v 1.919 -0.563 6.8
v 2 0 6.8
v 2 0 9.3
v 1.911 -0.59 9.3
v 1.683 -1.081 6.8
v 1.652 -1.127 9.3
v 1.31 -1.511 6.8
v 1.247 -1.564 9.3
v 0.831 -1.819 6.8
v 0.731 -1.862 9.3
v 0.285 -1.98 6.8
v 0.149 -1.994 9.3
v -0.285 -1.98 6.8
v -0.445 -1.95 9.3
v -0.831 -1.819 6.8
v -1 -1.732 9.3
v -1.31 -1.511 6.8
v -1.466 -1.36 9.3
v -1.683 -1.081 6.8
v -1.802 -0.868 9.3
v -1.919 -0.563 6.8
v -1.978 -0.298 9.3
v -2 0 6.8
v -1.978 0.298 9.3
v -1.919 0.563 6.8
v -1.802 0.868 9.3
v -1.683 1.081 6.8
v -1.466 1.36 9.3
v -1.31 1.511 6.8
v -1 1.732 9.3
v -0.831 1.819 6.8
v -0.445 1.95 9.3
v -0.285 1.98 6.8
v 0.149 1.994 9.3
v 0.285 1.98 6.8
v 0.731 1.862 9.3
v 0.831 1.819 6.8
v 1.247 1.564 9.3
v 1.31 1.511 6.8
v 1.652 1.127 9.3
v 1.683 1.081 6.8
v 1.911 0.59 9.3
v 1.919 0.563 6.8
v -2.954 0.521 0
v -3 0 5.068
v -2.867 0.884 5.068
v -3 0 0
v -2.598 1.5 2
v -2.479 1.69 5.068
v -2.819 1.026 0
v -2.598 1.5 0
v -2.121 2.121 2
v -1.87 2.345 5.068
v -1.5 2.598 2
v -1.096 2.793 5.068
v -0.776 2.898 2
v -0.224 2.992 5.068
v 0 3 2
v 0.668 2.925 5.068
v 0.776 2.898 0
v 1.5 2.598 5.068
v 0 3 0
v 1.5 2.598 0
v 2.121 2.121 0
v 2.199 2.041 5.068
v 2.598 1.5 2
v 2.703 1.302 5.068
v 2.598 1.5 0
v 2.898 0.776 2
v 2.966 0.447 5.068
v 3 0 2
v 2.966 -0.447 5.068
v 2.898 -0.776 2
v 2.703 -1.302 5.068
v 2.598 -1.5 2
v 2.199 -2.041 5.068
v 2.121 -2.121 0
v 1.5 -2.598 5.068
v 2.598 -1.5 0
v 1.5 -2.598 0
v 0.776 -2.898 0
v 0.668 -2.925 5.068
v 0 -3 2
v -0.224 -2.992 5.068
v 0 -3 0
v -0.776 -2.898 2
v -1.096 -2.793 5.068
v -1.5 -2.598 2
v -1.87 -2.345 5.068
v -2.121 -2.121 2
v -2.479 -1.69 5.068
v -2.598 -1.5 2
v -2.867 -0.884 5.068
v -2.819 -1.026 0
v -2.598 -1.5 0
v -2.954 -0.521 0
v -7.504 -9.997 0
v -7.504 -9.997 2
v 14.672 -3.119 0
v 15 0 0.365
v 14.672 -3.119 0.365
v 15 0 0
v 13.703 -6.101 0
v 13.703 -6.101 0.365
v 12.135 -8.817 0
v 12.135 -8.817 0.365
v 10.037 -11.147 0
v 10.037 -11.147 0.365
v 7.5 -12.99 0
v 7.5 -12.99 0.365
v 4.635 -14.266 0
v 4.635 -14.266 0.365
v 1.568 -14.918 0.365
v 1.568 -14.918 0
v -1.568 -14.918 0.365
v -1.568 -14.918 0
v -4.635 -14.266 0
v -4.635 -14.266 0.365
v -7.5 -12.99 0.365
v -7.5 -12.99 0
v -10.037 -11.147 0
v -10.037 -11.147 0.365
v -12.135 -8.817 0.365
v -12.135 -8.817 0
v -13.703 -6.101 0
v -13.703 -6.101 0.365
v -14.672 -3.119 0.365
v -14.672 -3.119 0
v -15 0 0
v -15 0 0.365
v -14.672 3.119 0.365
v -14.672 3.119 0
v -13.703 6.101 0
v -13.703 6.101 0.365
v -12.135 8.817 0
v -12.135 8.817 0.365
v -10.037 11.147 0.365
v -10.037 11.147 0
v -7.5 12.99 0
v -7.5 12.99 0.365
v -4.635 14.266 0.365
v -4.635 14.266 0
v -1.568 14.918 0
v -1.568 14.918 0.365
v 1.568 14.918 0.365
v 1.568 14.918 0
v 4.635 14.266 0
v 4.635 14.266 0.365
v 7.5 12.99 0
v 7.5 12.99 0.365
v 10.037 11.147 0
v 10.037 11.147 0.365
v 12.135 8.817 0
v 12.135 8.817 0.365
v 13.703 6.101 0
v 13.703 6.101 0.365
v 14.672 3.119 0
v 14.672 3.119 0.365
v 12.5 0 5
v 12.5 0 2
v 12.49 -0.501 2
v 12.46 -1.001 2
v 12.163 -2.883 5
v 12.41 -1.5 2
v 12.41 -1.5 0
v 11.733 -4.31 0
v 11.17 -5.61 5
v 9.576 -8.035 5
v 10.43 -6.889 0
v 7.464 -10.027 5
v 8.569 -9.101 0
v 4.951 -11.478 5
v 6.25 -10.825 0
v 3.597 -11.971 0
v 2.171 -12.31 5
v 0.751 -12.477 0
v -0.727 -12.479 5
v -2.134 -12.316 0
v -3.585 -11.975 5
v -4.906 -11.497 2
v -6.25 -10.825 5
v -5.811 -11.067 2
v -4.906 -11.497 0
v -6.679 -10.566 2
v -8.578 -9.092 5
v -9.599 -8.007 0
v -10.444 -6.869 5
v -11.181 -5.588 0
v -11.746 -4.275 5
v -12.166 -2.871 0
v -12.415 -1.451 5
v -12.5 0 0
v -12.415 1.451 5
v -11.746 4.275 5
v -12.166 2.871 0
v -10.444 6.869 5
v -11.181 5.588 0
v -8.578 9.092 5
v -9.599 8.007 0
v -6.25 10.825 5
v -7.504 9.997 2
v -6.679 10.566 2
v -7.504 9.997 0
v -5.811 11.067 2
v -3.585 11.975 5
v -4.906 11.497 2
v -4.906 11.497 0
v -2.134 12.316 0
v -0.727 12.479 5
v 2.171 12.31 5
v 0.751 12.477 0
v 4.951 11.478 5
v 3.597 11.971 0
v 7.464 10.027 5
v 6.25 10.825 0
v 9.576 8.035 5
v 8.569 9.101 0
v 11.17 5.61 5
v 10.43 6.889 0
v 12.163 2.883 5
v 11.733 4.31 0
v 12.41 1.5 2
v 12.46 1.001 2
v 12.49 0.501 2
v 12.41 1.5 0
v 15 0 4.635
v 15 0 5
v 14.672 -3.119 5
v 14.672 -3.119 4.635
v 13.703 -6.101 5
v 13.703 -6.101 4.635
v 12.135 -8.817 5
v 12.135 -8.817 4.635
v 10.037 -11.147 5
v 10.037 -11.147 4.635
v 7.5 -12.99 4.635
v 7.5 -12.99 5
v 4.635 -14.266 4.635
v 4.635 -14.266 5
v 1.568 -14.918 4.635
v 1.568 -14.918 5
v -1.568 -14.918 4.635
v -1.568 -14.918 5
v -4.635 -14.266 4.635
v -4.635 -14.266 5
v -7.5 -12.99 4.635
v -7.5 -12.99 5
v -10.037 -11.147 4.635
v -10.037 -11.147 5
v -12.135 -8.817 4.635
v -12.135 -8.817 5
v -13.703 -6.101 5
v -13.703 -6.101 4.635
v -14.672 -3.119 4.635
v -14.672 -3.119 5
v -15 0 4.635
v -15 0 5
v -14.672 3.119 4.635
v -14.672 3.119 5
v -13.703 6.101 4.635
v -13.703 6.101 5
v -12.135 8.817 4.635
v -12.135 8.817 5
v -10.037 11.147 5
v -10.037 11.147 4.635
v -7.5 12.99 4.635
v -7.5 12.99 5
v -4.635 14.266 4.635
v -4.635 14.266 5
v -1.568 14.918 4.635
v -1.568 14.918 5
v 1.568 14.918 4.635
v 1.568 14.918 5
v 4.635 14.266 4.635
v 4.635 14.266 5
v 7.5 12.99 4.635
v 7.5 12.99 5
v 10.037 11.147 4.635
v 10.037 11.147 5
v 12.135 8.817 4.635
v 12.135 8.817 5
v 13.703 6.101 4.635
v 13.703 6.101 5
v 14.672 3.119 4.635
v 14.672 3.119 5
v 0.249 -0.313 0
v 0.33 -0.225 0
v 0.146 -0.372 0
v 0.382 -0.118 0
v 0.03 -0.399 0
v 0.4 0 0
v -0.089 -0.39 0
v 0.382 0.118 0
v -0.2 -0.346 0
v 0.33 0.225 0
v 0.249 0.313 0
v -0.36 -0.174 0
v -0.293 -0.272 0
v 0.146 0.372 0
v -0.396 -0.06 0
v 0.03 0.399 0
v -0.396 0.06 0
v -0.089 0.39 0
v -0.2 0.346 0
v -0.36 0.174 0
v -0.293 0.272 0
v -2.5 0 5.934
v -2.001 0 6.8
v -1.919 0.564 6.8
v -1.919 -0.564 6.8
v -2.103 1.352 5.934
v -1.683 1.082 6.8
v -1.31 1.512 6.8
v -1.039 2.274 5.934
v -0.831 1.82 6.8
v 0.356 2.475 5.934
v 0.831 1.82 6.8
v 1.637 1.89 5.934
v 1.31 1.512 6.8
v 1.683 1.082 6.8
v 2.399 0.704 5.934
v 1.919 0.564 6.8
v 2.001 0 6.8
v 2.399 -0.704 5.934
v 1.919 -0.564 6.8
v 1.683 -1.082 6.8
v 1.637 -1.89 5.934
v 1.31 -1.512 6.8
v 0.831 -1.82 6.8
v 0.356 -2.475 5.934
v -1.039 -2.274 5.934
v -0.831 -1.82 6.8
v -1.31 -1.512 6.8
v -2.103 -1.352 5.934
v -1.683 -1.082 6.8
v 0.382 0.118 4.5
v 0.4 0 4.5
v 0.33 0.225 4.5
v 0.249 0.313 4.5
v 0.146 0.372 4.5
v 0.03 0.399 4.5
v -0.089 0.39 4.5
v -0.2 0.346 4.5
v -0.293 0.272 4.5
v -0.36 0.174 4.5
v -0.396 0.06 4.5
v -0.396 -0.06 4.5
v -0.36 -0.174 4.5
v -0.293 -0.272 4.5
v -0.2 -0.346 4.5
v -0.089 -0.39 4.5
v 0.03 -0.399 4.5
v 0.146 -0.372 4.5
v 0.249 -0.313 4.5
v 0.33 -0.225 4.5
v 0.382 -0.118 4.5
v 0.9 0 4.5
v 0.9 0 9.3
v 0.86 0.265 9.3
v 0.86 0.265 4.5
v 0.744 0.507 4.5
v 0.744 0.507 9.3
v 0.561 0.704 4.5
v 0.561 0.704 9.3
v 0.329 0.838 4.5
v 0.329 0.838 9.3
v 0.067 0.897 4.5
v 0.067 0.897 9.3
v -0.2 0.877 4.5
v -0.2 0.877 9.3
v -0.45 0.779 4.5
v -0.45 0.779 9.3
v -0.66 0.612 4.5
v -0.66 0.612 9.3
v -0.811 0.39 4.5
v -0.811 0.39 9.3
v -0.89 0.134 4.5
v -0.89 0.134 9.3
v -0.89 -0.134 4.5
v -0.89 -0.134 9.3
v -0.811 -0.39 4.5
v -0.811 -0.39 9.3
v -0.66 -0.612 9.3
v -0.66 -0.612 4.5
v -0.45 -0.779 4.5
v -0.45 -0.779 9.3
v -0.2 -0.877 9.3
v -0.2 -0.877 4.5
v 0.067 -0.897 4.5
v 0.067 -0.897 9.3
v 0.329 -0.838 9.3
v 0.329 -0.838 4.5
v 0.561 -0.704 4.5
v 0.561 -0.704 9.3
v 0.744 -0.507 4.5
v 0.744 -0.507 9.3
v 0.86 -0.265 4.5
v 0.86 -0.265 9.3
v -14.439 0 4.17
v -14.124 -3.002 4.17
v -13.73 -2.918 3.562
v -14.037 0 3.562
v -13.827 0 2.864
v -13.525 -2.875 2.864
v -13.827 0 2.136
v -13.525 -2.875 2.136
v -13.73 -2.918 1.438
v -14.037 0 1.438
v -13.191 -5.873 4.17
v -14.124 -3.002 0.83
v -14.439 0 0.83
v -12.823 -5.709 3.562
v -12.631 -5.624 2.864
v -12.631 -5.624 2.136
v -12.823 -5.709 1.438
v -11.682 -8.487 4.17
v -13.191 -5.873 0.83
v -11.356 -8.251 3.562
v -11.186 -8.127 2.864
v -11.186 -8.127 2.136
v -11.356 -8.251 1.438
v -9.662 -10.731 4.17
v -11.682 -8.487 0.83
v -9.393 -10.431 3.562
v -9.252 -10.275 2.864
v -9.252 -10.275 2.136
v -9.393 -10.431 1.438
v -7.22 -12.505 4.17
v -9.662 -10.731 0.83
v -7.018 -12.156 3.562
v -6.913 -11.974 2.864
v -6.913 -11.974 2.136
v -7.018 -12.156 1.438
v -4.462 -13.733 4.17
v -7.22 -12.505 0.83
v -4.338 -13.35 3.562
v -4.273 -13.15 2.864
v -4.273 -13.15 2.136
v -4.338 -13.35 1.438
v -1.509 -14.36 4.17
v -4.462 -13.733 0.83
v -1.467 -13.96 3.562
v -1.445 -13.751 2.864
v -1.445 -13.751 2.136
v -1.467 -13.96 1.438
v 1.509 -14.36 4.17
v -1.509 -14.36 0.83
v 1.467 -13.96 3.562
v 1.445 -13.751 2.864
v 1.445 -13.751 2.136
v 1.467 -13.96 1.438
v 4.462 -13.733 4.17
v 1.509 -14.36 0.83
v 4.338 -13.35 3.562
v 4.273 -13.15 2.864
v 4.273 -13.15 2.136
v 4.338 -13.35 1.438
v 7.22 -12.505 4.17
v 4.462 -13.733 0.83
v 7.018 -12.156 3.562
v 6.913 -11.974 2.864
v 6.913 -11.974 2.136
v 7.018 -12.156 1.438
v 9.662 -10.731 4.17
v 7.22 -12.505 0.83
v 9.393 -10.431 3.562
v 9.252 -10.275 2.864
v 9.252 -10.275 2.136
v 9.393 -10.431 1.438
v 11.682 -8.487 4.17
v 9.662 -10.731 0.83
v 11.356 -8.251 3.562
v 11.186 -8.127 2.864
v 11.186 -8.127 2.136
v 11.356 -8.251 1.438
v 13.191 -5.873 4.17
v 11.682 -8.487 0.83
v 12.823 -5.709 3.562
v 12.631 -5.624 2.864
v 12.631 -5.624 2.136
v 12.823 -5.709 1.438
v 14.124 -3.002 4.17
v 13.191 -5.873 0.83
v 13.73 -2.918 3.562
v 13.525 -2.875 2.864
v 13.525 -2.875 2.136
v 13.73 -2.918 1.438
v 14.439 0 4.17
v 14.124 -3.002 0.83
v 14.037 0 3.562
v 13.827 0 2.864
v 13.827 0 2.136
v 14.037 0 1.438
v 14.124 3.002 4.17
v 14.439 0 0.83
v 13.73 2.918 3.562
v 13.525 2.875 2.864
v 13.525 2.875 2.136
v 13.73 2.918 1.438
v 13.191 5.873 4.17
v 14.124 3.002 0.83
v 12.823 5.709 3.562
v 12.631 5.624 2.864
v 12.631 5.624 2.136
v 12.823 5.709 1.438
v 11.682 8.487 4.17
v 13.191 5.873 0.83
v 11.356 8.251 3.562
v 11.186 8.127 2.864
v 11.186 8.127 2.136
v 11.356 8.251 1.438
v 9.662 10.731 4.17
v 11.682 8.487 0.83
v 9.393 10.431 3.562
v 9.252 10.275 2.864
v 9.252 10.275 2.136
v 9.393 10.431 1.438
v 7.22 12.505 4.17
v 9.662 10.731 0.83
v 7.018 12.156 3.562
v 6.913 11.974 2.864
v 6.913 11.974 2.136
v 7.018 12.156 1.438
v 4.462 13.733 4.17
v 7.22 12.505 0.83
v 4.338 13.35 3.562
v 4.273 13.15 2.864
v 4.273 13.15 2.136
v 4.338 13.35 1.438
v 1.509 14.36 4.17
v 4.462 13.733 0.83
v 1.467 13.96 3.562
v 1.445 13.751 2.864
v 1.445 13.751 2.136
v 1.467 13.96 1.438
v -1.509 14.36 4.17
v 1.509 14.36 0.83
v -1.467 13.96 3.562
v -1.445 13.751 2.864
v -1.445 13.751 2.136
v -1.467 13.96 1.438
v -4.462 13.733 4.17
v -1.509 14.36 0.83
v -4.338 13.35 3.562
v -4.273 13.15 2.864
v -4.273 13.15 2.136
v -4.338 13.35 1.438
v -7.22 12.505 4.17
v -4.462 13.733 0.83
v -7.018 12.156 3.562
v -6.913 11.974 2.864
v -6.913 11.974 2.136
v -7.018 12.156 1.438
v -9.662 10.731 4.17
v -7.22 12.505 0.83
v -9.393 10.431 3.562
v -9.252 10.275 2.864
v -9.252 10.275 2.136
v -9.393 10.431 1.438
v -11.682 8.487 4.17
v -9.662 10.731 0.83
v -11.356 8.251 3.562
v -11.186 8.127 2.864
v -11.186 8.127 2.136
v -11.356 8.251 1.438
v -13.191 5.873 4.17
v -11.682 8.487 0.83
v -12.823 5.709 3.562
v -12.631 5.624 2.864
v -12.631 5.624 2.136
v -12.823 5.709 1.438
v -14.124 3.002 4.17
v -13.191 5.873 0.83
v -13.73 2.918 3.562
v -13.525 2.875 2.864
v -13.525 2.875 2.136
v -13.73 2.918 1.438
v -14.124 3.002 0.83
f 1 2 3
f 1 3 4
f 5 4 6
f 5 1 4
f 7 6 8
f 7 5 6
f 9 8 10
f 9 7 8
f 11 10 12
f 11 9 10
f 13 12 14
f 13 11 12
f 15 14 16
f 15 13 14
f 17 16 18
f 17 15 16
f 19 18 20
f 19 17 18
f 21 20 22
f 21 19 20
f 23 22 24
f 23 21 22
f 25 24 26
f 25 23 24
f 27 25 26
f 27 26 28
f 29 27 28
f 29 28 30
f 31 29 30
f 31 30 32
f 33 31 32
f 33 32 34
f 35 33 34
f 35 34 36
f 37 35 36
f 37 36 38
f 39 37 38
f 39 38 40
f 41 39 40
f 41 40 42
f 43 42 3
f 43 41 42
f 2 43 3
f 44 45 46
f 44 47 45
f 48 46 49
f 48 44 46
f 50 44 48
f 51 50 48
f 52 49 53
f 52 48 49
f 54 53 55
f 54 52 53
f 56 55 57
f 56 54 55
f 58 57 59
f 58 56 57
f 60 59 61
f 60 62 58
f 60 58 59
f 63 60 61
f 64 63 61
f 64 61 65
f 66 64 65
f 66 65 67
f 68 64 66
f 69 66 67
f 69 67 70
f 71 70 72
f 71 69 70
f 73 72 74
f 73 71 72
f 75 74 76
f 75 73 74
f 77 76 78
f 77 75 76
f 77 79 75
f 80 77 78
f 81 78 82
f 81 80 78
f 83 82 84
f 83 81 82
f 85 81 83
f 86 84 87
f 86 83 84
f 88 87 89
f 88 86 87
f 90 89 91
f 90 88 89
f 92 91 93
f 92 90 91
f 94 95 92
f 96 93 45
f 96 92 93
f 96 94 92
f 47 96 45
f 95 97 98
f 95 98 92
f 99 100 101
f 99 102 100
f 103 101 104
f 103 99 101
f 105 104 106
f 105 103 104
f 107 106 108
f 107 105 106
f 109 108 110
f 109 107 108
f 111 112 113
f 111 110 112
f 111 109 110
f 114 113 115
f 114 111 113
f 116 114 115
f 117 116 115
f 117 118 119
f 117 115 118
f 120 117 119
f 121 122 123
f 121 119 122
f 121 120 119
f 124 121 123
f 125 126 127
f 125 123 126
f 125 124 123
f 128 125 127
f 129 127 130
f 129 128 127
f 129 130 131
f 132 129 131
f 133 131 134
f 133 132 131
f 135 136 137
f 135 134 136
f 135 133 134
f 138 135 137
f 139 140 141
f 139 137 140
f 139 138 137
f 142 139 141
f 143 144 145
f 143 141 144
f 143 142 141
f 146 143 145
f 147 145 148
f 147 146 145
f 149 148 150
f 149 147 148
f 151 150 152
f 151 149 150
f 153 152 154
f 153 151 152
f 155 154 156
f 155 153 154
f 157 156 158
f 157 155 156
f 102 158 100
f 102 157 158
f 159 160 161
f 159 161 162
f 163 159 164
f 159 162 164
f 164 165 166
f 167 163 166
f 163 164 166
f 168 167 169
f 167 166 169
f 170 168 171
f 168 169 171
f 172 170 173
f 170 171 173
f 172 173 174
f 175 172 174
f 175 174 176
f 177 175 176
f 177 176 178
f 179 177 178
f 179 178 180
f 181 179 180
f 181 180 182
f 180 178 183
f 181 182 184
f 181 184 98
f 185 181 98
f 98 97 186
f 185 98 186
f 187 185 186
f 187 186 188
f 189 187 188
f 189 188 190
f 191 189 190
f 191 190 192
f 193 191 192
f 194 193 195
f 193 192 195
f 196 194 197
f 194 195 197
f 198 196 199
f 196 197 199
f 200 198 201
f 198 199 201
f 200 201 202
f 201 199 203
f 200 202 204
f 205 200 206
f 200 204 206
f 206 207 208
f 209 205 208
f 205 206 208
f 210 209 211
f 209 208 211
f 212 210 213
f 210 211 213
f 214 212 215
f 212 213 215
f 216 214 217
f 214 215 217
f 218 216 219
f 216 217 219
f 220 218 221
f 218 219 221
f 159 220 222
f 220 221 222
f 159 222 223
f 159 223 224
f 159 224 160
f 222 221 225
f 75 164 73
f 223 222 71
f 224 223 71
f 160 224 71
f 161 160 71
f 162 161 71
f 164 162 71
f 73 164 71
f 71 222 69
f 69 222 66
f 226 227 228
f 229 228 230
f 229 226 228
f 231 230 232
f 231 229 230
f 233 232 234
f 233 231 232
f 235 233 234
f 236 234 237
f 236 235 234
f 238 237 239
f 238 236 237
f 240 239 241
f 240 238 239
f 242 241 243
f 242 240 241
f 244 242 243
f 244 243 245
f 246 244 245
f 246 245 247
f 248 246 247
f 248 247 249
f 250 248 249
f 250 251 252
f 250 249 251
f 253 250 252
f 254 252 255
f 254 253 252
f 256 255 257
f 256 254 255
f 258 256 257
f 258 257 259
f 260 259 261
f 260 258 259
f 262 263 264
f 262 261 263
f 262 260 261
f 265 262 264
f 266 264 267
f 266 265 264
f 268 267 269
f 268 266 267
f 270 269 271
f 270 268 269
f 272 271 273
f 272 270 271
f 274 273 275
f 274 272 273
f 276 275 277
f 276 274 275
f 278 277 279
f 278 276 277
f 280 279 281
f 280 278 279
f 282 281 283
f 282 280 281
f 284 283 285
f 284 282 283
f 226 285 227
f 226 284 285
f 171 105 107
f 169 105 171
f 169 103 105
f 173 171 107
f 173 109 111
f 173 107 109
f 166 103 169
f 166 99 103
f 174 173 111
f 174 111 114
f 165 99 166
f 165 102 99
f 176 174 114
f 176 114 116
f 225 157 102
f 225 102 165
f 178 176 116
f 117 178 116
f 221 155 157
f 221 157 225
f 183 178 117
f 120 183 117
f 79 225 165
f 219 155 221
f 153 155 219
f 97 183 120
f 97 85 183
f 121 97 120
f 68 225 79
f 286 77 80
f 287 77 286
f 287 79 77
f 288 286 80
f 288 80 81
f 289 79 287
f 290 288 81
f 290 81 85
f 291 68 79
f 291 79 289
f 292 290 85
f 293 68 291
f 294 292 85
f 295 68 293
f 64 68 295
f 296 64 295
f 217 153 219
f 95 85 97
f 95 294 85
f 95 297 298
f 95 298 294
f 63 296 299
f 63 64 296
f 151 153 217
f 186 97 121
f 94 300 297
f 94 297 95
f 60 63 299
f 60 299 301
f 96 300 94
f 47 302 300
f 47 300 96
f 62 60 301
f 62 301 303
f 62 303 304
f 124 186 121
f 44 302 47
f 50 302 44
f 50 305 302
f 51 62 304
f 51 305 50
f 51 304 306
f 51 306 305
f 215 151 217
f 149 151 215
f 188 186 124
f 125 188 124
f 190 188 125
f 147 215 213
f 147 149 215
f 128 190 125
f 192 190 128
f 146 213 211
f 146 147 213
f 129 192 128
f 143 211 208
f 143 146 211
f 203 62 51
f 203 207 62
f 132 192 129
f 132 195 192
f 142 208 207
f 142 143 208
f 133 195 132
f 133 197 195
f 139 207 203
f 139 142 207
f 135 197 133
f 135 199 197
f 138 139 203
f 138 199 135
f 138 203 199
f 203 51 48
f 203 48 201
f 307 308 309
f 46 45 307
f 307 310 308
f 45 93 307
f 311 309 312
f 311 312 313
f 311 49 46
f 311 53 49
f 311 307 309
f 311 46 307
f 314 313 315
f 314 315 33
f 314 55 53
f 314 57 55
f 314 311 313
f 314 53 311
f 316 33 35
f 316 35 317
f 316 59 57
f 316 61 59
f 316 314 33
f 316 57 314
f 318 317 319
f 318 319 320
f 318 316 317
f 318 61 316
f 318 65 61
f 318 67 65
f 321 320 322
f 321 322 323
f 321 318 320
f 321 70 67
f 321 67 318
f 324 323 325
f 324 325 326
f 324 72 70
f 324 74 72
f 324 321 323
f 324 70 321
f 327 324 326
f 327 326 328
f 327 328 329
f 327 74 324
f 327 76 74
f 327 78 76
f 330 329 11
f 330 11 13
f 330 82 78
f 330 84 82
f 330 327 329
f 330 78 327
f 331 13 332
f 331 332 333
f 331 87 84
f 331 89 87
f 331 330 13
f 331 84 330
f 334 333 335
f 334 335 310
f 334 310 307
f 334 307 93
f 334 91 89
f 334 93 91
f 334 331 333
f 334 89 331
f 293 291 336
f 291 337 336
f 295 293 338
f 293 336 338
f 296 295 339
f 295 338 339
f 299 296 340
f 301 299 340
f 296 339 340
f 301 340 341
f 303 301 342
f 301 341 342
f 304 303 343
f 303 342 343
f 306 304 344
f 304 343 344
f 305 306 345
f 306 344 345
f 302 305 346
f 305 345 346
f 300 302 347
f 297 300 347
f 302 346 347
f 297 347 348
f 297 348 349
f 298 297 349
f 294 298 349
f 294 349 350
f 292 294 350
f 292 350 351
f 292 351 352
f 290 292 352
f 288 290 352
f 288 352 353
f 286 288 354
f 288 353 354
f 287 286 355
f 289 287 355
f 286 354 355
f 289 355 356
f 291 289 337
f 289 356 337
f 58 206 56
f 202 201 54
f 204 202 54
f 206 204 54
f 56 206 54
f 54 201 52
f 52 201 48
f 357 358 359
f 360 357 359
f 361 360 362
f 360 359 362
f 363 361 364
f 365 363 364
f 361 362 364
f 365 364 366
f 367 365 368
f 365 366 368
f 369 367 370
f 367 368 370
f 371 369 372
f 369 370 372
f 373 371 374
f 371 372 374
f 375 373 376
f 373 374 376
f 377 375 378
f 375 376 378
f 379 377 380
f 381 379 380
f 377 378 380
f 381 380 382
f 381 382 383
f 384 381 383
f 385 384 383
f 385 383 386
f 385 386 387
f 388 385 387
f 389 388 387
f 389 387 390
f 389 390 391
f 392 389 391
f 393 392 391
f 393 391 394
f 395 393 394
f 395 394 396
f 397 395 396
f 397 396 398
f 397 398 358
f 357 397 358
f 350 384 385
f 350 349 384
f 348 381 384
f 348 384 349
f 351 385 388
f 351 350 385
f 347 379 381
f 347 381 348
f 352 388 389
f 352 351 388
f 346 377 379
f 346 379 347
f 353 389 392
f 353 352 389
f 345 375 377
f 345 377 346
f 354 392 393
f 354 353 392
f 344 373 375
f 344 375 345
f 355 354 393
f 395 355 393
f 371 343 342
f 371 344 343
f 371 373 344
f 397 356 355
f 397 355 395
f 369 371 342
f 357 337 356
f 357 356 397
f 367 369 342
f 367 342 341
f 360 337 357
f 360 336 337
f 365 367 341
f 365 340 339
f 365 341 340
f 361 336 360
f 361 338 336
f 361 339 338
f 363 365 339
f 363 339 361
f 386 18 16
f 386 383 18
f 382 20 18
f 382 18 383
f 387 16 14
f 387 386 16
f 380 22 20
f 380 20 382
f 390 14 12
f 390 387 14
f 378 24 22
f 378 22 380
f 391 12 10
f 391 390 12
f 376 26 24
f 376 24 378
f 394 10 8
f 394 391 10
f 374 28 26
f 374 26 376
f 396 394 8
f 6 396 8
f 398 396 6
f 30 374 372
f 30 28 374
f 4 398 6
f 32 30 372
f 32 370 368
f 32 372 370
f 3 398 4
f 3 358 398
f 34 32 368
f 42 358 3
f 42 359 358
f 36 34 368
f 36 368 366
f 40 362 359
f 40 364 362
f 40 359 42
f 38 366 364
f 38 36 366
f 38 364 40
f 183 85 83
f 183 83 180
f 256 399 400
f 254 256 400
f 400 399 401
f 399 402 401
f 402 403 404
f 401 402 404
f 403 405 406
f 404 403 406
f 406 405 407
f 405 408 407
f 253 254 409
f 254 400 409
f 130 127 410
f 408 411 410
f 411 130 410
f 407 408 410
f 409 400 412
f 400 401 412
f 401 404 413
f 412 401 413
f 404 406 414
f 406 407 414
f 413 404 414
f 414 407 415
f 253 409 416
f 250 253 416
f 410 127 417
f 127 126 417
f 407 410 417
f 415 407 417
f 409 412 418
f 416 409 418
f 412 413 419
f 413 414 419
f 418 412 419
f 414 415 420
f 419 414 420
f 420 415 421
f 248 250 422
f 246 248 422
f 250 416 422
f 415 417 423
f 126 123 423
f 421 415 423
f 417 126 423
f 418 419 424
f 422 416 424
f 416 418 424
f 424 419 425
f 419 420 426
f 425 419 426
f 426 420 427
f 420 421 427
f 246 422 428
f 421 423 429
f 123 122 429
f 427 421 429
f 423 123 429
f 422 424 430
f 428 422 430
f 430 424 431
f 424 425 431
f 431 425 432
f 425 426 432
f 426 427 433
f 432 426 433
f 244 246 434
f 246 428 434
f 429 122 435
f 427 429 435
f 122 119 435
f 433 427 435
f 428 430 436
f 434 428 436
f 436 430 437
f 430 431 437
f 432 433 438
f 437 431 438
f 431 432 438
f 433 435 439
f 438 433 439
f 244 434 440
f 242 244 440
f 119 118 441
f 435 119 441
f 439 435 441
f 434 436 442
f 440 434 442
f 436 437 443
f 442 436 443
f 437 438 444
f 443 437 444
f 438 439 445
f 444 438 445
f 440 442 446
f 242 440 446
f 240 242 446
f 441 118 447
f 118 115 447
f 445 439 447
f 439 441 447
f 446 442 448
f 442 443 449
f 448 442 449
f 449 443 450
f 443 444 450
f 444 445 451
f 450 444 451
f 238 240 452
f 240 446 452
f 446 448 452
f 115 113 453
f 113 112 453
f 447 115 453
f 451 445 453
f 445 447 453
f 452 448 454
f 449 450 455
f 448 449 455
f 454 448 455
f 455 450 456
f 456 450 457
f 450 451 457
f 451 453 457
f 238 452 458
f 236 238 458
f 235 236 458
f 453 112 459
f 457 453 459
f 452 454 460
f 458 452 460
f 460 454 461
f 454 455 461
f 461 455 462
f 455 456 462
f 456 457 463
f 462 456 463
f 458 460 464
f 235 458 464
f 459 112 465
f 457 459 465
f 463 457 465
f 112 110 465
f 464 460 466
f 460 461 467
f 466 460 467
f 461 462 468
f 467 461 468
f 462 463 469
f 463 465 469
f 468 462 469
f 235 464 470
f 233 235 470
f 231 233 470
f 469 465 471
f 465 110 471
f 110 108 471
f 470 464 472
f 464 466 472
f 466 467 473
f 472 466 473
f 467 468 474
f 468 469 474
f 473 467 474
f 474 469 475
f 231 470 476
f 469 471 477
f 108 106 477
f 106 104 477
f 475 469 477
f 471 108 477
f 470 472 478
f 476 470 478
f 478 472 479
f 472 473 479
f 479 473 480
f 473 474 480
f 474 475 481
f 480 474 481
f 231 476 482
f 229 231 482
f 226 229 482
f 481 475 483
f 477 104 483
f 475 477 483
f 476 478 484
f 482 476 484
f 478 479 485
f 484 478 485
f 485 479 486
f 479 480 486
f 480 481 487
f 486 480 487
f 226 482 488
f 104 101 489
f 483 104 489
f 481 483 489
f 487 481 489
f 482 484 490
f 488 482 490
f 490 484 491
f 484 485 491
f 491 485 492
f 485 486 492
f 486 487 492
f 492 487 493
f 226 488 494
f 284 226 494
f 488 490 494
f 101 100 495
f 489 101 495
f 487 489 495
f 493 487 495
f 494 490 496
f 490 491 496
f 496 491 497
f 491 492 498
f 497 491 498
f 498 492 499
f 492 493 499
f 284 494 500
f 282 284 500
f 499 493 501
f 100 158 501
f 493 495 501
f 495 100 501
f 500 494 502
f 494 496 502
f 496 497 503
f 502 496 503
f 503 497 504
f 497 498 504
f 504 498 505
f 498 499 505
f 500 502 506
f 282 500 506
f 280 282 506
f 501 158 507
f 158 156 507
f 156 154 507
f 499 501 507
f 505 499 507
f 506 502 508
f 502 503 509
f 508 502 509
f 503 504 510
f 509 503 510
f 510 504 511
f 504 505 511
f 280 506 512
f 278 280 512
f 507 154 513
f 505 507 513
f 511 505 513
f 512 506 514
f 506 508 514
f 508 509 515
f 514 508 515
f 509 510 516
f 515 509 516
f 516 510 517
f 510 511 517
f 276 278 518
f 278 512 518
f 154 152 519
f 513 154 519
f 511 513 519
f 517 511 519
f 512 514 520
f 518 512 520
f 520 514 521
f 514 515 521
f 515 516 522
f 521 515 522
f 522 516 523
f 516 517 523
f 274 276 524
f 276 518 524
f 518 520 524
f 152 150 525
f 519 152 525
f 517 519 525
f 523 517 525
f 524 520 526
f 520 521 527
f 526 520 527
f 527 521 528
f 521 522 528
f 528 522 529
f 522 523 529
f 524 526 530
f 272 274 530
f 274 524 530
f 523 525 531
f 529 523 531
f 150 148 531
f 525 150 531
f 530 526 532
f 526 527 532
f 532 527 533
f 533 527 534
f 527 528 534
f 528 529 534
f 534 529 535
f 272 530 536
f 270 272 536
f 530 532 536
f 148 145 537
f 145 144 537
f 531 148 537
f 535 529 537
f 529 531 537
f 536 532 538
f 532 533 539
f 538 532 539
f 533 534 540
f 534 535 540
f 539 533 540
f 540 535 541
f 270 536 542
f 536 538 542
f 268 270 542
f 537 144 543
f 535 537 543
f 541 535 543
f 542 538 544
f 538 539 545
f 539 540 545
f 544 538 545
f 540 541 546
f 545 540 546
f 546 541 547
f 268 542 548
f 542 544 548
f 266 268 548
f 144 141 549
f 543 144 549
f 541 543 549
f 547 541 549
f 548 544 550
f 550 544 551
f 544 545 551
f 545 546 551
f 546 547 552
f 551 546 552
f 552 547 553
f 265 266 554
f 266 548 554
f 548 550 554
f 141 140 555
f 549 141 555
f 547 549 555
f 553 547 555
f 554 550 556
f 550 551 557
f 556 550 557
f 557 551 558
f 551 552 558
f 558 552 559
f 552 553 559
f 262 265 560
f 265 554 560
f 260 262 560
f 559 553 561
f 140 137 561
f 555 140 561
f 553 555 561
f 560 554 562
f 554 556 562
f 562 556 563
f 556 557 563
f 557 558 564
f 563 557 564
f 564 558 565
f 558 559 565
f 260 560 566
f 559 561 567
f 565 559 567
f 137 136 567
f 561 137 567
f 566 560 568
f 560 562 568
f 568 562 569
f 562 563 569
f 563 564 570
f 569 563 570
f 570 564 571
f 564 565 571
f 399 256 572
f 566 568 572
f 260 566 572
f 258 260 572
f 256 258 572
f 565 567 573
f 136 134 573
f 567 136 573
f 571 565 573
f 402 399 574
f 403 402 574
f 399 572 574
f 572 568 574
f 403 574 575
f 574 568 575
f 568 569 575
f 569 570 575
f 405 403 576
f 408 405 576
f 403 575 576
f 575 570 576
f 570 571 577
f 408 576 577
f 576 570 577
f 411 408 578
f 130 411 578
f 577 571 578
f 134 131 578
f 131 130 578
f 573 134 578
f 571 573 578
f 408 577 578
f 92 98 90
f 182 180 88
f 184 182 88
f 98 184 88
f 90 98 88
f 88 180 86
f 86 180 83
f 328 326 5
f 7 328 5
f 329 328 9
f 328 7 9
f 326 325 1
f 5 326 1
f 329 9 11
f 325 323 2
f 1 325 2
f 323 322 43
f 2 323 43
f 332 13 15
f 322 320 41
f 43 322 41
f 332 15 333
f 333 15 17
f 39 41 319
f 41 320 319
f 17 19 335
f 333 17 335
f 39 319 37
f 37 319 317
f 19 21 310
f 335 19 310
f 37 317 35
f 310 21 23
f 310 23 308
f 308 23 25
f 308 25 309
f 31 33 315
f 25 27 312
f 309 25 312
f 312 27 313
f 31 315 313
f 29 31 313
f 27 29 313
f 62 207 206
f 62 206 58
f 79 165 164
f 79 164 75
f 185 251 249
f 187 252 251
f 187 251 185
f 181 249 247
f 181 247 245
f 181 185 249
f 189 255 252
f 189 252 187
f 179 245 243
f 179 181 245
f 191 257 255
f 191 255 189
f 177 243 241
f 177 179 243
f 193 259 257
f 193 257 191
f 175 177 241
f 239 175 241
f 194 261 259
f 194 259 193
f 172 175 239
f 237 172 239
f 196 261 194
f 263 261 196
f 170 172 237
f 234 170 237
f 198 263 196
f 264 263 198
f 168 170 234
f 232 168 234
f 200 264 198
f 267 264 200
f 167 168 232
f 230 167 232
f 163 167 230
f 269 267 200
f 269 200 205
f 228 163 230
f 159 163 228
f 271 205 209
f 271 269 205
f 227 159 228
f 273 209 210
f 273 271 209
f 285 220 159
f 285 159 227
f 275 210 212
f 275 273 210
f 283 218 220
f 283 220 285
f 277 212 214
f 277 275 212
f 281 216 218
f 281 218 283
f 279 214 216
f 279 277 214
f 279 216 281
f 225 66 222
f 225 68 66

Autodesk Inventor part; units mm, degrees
ref_plane "YZ Plane" through (0, 0, 0) normal (1, 0, 0) x (0, 1, 0)
ref_plane "XZ Plane" through (0, 0, 0) normal (0, 1, 0) x (-1, 0, 0)
ref_plane "XY Plane" through (0, 0, 0) normal (0, 0, 1) x (1, 0, 0)
sketch "Sketch1" plane through (0, 0, 0) normal (0, 0, 1) x (1, 0, 0)
  circle A0 centre (0, 0) radius 15
  circle A1 centre (0, 0) radius 12.5
  dimension "d0" = 30
  dimension "d1" = 25
extrude "Extrusion1" add sketch "Sketch1" along normal blind 5
sketch "Sketch2" plane through (0, 0, 0) normal (0, 0, -1) x (-1, 0, 0)
  circle A0 centre (0, 0) radius 3
  dimension "d5" = 6
extrude "Extrusion2" add sketch "Sketch2" against normal blind 6.8
sketch "Sketch3" plane through (0, 0, 6.8) normal (0, 0, 1) x (1, 0, 0)
  circle A0 centre (0, 0) radius 2
  dimension "d8" = 4
extrude "Extrusion3" add sketch "Sketch3" along normal blind 2.5
chamfer "Chamfer1" distance 1 angle 60 1 edges at (3, 0, 6.8) measured on face at (-2.6182, -0.3989, 6.8)
sketch "Sketch4" plane through (0, 0, 9.3) normal (0, 0, 1) x (1, 0, 0)
  circle A0 centre (0, 0) radius 0.9
  dimension "d14" = 1.8
extrude "Extrusion4" cut sketch "Sketch4" against normal blind 4.8
sketch "Sketch5" plane through (0, 0, 0) normal (0, 0, -1) x (-1, 0, 0)
  line L0 (-2, 1.5) -> (-13, 1.5)
  line L1 (-13, 1.5) -> (-13, -1.5)
  line L2 (-13, -1.5) -> (-2, -1.5)
  line L3 (-2, -1.5) -> (-2, 1.5)
  circle A0 centre (0, 0) radius 0.9 projected
  line L4 (0, 0) -> (-17.4633, 0) construction
  circle A1 centre (0, 0) radius 3
  circle A2 centre (0, 0) radius 12.5
  point P0 (-13, 0)
  point P1 (-12.4097, 1.5)
  point P2 (-12.4097, -1.5)
  point P3 (-2.5981, -1.5)
  point P4 (-2.5981, 1.5)
  dimension "d19" = 3
  dimension "d20" = 11
extrude "Extrusion6" add sketch "Sketch5" against normal blind 2 contours A1 L2 A2 L0 picked at (-9.3212, 0.1045)
pattern_circular "Circular Pattern2" count 3 over 360 about axis through (0, 0, -10) along (0, 0, 1) of "Extrusion6"
sketch "Sketch6" plane through (0, 0, 4.5) normal (0, 0, 1) x (1, 0, 0)
  circle A0 centre (0, 0) radius 2 projected
  circle A1 centre (0, 0) radius 0.4
  dimension "d32" = 0.8
extrude "Extrusion7" cut sketch "Sketch6" against normal blind 5.3 contours A1
sketch "Sketch7" plane through (0, 0, 0) normal (0, 1, 0) x (-1, 0, 0)
  point P0 (0, 0)
sketch "Sketch8" plane through (0, 0, 0) normal (0, 1, 0) x (-1, 0, 0)
  line L0 (15, 0) -> (15, 5) projected
  circle A0 centre (16.3, 2.5) radius 2.5
  line L1 (0, 0) -> (0, 2) projected
  line L2 (0, 0) -> (0, 12.0754) construction
  point P0 (15, 2.5)
  point P1 (15, 4.6354)
  point P2 (15, 0.3646)
  dimension "d35" = 5
  dimension "d36" = 1.3
revolve "Revolution1" cut sketch "Sketch8" angle 360 about axis through (0, 0, 0) along (0, 0, 1)
properties part number "Koło"
